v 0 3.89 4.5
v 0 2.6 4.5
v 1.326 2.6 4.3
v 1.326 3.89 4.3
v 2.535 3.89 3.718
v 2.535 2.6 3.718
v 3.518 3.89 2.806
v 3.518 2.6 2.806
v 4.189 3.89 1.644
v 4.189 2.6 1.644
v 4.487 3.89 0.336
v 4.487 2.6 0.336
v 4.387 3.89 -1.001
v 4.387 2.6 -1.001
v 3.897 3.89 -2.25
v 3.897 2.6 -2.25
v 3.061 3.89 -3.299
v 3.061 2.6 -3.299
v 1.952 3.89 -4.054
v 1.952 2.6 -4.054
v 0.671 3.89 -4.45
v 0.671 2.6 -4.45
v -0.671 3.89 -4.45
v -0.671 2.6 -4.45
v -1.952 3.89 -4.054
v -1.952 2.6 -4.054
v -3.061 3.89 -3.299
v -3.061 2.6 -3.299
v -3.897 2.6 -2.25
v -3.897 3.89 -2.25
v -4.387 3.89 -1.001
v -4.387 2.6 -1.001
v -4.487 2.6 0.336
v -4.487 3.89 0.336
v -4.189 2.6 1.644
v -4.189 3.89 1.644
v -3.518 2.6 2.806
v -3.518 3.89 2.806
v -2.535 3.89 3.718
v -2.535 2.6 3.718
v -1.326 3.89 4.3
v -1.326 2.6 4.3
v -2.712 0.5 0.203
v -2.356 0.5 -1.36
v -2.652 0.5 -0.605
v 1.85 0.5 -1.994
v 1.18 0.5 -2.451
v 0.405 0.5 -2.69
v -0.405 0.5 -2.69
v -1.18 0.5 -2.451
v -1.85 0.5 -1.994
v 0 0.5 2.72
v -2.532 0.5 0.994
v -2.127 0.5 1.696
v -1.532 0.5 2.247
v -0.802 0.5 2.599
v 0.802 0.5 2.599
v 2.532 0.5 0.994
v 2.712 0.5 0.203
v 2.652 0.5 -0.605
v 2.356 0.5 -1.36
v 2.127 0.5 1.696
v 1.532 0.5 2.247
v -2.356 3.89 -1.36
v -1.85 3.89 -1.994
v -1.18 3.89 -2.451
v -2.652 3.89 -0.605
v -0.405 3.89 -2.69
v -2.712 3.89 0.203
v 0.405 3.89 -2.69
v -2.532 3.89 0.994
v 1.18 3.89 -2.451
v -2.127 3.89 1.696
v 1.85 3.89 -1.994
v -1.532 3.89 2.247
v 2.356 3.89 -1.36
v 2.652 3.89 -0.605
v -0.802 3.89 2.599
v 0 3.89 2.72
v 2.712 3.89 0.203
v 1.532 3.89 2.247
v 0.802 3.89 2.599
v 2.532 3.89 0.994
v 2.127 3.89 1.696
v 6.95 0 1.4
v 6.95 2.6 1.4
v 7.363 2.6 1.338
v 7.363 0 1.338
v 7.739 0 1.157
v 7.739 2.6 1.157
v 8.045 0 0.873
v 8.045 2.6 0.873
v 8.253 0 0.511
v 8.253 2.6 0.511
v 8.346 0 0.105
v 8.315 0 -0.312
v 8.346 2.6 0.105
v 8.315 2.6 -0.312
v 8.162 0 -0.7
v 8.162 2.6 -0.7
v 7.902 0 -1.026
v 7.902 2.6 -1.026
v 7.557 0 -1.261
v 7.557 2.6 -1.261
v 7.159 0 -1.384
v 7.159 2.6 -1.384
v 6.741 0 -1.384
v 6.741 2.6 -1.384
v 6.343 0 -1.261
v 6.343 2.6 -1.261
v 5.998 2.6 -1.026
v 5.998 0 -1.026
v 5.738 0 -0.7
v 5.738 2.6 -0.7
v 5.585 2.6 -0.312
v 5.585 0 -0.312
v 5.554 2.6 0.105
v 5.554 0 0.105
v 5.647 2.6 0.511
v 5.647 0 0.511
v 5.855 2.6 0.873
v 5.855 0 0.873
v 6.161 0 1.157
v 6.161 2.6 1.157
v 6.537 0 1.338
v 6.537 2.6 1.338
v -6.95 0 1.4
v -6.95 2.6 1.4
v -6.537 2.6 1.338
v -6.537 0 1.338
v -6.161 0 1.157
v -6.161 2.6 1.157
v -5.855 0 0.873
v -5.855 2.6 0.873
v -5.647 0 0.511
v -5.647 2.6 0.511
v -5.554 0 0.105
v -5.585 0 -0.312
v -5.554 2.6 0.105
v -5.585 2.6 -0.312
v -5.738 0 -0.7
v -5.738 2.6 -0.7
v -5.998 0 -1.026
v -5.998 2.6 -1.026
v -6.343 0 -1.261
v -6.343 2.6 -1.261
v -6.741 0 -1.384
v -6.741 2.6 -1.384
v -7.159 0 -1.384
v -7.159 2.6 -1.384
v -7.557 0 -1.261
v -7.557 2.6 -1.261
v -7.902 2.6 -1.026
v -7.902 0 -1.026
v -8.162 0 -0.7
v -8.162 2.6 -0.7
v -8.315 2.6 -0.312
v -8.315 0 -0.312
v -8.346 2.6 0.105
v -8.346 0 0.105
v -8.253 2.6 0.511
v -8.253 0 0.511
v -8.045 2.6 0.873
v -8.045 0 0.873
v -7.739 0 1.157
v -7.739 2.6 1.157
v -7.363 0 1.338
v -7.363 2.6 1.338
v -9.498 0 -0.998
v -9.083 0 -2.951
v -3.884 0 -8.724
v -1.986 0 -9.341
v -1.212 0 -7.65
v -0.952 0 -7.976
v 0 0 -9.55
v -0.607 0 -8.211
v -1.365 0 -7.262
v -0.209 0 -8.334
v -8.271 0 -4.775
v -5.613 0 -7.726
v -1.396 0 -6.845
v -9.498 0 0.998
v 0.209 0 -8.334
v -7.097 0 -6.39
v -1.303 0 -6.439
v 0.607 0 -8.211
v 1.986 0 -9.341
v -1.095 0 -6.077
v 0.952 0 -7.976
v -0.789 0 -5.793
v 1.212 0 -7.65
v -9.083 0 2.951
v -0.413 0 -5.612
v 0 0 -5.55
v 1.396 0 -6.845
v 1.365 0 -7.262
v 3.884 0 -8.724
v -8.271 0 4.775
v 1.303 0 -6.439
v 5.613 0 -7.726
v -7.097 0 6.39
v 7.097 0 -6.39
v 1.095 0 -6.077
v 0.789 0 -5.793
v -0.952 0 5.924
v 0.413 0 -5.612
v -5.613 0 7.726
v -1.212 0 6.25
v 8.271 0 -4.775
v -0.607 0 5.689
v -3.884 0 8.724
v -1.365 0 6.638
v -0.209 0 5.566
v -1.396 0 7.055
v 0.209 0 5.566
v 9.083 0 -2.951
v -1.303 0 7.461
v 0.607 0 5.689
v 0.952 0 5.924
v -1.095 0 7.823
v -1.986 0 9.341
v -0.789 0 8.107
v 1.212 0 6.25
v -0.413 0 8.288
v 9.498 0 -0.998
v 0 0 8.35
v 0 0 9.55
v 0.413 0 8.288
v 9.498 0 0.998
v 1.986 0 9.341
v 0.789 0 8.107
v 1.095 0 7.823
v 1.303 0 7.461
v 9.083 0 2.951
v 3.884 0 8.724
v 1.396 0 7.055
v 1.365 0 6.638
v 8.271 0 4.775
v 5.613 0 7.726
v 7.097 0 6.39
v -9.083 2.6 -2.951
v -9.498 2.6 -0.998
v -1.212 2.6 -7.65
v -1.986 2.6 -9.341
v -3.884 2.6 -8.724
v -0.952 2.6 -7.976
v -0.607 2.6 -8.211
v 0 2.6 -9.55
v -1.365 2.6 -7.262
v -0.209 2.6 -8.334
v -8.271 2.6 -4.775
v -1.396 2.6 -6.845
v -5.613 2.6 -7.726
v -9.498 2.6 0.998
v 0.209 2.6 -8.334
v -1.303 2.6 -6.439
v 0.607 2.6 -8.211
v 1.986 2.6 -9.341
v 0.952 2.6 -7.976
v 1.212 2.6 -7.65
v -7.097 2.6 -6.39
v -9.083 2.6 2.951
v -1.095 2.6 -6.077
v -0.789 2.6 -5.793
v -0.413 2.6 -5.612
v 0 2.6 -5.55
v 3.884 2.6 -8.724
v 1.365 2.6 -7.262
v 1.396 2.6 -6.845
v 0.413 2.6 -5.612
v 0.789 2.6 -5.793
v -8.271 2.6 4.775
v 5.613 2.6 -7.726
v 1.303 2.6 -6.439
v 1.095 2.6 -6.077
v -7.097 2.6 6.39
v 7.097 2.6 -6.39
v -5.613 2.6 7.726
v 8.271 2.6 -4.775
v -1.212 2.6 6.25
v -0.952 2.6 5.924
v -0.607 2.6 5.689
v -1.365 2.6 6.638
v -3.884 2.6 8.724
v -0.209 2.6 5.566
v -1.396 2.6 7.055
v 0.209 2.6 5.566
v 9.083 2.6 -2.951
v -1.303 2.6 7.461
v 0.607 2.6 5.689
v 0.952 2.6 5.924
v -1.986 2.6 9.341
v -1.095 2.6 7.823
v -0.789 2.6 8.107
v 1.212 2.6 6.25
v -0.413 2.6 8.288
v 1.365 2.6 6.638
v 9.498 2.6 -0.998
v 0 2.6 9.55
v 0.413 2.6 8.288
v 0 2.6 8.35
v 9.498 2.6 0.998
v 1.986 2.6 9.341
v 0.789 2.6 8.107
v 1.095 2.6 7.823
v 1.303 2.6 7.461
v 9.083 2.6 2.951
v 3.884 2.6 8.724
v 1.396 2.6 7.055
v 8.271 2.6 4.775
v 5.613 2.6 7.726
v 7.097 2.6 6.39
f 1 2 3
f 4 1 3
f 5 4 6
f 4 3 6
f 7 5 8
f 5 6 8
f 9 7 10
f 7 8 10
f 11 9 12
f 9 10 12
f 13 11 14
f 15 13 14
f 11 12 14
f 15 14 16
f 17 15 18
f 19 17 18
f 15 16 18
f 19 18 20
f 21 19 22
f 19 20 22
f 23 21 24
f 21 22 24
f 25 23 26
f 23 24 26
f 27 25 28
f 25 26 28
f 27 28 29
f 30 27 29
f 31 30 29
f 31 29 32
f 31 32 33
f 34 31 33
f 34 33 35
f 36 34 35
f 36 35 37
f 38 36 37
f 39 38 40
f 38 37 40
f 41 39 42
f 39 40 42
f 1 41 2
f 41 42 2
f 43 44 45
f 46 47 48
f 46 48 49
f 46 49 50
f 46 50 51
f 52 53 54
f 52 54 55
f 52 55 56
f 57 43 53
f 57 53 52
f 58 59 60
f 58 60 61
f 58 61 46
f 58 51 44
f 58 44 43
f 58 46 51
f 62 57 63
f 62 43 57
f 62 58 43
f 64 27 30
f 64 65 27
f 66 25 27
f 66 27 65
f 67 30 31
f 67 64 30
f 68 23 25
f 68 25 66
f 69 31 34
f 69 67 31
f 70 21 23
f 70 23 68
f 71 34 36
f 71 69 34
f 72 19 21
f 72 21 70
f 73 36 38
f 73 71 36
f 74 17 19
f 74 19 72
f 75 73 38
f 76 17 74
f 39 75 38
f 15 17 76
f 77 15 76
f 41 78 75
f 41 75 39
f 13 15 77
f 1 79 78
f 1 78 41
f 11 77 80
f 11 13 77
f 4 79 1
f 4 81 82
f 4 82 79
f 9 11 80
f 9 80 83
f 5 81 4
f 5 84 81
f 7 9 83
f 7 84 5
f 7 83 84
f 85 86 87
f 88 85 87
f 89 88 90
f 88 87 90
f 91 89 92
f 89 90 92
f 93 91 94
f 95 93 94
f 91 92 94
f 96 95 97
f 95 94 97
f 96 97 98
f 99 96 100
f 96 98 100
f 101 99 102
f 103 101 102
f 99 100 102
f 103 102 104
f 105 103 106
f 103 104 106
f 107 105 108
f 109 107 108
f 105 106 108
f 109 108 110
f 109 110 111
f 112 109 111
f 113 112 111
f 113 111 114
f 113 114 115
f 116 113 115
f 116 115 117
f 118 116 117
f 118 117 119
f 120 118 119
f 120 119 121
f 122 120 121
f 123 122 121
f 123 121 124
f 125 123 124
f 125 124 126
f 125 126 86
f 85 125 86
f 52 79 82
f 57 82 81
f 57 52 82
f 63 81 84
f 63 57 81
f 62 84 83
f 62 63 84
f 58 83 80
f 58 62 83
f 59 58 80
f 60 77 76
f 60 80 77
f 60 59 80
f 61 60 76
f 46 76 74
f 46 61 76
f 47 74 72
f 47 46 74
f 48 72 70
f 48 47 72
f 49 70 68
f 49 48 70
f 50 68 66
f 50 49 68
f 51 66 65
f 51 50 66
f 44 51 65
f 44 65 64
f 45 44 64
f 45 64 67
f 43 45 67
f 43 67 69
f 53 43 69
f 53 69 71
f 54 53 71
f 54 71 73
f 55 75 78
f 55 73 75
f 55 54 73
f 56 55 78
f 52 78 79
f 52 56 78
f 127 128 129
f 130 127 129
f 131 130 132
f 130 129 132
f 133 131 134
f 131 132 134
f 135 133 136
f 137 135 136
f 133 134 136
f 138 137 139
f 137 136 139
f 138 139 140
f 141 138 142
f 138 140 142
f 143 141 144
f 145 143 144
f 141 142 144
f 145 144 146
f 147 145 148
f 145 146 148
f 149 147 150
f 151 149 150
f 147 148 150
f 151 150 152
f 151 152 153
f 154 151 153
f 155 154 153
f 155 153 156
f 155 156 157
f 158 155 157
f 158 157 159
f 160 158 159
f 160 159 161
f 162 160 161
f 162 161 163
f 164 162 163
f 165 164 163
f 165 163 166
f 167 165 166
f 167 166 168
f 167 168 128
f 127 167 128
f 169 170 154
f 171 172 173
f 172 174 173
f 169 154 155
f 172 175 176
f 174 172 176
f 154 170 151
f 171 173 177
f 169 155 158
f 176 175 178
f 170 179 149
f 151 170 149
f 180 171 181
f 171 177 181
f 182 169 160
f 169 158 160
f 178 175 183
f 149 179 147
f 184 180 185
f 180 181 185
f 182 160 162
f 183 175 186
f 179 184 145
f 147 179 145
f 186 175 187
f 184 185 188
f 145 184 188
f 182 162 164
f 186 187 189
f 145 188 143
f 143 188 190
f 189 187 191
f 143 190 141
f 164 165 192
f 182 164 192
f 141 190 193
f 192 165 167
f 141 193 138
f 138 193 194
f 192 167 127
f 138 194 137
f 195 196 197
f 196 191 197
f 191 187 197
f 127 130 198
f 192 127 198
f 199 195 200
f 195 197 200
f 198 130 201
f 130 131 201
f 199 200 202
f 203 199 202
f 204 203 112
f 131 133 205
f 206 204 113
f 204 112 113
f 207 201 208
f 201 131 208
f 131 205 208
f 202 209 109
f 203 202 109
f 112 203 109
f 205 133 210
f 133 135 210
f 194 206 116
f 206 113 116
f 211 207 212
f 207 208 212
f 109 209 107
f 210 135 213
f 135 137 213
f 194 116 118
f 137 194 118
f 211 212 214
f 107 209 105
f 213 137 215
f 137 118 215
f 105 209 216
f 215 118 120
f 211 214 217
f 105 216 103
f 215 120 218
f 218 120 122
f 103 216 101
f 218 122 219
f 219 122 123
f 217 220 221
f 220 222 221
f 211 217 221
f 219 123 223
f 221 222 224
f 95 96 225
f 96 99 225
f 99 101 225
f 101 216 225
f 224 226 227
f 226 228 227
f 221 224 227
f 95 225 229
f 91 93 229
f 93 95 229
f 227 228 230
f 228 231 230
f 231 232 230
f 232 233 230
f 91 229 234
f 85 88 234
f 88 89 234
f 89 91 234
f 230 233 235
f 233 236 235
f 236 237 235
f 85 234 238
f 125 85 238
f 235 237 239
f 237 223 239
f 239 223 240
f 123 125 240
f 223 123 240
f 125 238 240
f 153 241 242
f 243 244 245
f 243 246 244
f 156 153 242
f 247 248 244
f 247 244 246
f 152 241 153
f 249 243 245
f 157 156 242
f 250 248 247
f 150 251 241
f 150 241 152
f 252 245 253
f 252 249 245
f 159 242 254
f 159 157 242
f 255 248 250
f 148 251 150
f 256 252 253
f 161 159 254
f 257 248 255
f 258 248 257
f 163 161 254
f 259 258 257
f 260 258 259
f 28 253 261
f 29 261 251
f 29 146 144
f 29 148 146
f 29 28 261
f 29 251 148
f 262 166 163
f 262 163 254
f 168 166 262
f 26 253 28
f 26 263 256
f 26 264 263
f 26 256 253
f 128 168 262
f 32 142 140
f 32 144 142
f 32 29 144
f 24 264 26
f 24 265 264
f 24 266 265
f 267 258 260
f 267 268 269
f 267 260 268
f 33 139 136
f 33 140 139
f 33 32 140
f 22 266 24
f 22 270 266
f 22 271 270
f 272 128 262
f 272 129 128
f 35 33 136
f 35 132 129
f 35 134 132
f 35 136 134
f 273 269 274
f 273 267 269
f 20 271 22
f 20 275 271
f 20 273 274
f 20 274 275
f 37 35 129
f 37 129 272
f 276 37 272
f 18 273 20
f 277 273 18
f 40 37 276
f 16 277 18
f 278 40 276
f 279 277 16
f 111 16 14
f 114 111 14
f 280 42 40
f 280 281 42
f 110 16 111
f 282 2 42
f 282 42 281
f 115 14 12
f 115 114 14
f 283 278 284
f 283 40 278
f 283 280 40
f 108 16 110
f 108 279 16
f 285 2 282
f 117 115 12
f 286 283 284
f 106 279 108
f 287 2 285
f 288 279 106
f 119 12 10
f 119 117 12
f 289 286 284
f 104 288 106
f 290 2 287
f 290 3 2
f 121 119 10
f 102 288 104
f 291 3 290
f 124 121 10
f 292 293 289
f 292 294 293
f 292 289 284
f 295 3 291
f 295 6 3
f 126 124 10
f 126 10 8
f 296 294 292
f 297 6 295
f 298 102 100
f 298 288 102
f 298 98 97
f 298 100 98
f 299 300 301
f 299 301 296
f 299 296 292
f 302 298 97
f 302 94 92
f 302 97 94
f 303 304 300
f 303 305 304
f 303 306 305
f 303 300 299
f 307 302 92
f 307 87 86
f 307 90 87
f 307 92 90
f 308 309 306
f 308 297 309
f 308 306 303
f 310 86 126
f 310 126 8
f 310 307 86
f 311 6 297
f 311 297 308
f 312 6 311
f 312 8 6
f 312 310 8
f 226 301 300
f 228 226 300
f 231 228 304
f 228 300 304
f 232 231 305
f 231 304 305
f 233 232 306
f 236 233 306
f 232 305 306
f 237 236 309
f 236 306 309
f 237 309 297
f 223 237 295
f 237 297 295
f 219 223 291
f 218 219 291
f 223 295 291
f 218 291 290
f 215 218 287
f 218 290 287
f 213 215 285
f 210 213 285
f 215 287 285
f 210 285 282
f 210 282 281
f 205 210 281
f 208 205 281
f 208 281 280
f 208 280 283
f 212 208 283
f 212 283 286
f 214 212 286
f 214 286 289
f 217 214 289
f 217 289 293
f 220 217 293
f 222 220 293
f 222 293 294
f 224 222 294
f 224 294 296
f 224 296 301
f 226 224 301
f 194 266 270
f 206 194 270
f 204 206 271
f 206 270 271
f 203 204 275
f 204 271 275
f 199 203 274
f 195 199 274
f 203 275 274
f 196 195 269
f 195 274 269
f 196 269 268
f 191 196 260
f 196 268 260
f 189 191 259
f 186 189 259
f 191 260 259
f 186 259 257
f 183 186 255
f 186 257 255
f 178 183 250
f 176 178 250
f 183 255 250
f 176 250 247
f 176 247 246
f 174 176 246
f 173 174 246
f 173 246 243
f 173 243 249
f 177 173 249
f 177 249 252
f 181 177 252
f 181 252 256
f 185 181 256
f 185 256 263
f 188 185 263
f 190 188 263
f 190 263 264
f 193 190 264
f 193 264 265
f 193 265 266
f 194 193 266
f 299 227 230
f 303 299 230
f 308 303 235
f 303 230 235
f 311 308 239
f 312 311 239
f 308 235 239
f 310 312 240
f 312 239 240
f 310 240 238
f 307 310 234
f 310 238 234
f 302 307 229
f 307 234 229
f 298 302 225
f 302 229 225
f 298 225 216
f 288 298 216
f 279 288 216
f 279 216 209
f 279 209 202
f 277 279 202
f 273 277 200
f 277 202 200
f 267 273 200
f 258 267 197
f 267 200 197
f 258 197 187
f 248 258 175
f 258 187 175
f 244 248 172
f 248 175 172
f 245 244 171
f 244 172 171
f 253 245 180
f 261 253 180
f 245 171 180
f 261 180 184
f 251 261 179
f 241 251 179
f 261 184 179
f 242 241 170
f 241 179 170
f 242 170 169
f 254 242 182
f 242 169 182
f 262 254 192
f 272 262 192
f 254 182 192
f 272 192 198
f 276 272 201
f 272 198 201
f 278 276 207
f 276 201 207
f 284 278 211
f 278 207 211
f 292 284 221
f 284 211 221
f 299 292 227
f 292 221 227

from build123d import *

# Parameters (mm, degrees)
SKETCH1_R               = 9.55
BOSS_EXTRUDE1_DEPTH     = 2.6
SKETCH2_R               = 4.5
BOSS_EXTRUDE2_DEPTH     = 1.29
CUT_EXTRUDE1_DEPTH      = 15.054789219
CUT_EXTRUDE1_DEPTH_BACK = 3.39
SKETCH3_R               = 2.72
SKETCH4_R               = 1.4
CUT_EXTRUDE2_DEPTH      = 14.753726768


with BuildPart() as part:
    # Sketch1 → Boss-Extrude1 (new body)
    with BuildSketch(Plane(origin=(0, 0, 0), x_dir=(1, 0, 0), z_dir=(0, 1, 0))):
        with Locations(Location((0, 0, 0), (0, 0, 270))):
            Circle(SKETCH1_R)
    extrude(amount=BOSS_EXTRUDE1_DEPTH)

    # Sketch2 → Boss-Extrude2 (add)
    with BuildSketch(Plane(origin=(0, 2.6, 0), x_dir=(1, 0, 0), z_dir=(0, 1, 0))):
        with Locations(Location((0, 0, 0), (0, 0, 270))):
            Circle(SKETCH2_R)
    extrude(amount=BOSS_EXTRUDE2_DEPTH)

    # Sketch3 → Cut-Extrude1 (cut, two sides: drawn at the far end of the back side and taken through both)
    with BuildSketch(Plane(origin=(0, 3.89, 0), x_dir=(1, 0, 0), z_dir=(0, 1, 0)).offset(-CUT_EXTRUDE1_DEPTH_BACK)):
        with Locations(Location((0, 0, 0), (0, 0, 270))):
            Circle(SKETCH3_R)
    extrude(amount=CUT_EXTRUDE1_DEPTH + CUT_EXTRUDE1_DEPTH_BACK, mode=Mode.SUBTRACT)

    # Sketch4 → Cut-Extrude2 (cut, through all)
    with BuildSketch(Plane(origin=(0, 2.6, 0), x_dir=(1, 0, 0), z_dir=(0, 1, 0))):
        with Locations(Location((0, 6.95, 0), (0, 0, 270))):
            Circle(SKETCH4_R)
        with Locations(Location((6.95, 0, 0), (0, 0, 270))):
            Circle(SKETCH4_R)
        with Locations(Location((0, -6.95, 0), (0, 0, 270))):
            Circle(SKETCH4_R)
        with Locations(Location((-6.95, 0, 0), (0, 0, 270))):
            Circle(SKETCH4_R)
    extrude(amount=-CUT_EXTRUDE2_DEPTH, mode=Mode.SUBTRACT)


solid = part.part
